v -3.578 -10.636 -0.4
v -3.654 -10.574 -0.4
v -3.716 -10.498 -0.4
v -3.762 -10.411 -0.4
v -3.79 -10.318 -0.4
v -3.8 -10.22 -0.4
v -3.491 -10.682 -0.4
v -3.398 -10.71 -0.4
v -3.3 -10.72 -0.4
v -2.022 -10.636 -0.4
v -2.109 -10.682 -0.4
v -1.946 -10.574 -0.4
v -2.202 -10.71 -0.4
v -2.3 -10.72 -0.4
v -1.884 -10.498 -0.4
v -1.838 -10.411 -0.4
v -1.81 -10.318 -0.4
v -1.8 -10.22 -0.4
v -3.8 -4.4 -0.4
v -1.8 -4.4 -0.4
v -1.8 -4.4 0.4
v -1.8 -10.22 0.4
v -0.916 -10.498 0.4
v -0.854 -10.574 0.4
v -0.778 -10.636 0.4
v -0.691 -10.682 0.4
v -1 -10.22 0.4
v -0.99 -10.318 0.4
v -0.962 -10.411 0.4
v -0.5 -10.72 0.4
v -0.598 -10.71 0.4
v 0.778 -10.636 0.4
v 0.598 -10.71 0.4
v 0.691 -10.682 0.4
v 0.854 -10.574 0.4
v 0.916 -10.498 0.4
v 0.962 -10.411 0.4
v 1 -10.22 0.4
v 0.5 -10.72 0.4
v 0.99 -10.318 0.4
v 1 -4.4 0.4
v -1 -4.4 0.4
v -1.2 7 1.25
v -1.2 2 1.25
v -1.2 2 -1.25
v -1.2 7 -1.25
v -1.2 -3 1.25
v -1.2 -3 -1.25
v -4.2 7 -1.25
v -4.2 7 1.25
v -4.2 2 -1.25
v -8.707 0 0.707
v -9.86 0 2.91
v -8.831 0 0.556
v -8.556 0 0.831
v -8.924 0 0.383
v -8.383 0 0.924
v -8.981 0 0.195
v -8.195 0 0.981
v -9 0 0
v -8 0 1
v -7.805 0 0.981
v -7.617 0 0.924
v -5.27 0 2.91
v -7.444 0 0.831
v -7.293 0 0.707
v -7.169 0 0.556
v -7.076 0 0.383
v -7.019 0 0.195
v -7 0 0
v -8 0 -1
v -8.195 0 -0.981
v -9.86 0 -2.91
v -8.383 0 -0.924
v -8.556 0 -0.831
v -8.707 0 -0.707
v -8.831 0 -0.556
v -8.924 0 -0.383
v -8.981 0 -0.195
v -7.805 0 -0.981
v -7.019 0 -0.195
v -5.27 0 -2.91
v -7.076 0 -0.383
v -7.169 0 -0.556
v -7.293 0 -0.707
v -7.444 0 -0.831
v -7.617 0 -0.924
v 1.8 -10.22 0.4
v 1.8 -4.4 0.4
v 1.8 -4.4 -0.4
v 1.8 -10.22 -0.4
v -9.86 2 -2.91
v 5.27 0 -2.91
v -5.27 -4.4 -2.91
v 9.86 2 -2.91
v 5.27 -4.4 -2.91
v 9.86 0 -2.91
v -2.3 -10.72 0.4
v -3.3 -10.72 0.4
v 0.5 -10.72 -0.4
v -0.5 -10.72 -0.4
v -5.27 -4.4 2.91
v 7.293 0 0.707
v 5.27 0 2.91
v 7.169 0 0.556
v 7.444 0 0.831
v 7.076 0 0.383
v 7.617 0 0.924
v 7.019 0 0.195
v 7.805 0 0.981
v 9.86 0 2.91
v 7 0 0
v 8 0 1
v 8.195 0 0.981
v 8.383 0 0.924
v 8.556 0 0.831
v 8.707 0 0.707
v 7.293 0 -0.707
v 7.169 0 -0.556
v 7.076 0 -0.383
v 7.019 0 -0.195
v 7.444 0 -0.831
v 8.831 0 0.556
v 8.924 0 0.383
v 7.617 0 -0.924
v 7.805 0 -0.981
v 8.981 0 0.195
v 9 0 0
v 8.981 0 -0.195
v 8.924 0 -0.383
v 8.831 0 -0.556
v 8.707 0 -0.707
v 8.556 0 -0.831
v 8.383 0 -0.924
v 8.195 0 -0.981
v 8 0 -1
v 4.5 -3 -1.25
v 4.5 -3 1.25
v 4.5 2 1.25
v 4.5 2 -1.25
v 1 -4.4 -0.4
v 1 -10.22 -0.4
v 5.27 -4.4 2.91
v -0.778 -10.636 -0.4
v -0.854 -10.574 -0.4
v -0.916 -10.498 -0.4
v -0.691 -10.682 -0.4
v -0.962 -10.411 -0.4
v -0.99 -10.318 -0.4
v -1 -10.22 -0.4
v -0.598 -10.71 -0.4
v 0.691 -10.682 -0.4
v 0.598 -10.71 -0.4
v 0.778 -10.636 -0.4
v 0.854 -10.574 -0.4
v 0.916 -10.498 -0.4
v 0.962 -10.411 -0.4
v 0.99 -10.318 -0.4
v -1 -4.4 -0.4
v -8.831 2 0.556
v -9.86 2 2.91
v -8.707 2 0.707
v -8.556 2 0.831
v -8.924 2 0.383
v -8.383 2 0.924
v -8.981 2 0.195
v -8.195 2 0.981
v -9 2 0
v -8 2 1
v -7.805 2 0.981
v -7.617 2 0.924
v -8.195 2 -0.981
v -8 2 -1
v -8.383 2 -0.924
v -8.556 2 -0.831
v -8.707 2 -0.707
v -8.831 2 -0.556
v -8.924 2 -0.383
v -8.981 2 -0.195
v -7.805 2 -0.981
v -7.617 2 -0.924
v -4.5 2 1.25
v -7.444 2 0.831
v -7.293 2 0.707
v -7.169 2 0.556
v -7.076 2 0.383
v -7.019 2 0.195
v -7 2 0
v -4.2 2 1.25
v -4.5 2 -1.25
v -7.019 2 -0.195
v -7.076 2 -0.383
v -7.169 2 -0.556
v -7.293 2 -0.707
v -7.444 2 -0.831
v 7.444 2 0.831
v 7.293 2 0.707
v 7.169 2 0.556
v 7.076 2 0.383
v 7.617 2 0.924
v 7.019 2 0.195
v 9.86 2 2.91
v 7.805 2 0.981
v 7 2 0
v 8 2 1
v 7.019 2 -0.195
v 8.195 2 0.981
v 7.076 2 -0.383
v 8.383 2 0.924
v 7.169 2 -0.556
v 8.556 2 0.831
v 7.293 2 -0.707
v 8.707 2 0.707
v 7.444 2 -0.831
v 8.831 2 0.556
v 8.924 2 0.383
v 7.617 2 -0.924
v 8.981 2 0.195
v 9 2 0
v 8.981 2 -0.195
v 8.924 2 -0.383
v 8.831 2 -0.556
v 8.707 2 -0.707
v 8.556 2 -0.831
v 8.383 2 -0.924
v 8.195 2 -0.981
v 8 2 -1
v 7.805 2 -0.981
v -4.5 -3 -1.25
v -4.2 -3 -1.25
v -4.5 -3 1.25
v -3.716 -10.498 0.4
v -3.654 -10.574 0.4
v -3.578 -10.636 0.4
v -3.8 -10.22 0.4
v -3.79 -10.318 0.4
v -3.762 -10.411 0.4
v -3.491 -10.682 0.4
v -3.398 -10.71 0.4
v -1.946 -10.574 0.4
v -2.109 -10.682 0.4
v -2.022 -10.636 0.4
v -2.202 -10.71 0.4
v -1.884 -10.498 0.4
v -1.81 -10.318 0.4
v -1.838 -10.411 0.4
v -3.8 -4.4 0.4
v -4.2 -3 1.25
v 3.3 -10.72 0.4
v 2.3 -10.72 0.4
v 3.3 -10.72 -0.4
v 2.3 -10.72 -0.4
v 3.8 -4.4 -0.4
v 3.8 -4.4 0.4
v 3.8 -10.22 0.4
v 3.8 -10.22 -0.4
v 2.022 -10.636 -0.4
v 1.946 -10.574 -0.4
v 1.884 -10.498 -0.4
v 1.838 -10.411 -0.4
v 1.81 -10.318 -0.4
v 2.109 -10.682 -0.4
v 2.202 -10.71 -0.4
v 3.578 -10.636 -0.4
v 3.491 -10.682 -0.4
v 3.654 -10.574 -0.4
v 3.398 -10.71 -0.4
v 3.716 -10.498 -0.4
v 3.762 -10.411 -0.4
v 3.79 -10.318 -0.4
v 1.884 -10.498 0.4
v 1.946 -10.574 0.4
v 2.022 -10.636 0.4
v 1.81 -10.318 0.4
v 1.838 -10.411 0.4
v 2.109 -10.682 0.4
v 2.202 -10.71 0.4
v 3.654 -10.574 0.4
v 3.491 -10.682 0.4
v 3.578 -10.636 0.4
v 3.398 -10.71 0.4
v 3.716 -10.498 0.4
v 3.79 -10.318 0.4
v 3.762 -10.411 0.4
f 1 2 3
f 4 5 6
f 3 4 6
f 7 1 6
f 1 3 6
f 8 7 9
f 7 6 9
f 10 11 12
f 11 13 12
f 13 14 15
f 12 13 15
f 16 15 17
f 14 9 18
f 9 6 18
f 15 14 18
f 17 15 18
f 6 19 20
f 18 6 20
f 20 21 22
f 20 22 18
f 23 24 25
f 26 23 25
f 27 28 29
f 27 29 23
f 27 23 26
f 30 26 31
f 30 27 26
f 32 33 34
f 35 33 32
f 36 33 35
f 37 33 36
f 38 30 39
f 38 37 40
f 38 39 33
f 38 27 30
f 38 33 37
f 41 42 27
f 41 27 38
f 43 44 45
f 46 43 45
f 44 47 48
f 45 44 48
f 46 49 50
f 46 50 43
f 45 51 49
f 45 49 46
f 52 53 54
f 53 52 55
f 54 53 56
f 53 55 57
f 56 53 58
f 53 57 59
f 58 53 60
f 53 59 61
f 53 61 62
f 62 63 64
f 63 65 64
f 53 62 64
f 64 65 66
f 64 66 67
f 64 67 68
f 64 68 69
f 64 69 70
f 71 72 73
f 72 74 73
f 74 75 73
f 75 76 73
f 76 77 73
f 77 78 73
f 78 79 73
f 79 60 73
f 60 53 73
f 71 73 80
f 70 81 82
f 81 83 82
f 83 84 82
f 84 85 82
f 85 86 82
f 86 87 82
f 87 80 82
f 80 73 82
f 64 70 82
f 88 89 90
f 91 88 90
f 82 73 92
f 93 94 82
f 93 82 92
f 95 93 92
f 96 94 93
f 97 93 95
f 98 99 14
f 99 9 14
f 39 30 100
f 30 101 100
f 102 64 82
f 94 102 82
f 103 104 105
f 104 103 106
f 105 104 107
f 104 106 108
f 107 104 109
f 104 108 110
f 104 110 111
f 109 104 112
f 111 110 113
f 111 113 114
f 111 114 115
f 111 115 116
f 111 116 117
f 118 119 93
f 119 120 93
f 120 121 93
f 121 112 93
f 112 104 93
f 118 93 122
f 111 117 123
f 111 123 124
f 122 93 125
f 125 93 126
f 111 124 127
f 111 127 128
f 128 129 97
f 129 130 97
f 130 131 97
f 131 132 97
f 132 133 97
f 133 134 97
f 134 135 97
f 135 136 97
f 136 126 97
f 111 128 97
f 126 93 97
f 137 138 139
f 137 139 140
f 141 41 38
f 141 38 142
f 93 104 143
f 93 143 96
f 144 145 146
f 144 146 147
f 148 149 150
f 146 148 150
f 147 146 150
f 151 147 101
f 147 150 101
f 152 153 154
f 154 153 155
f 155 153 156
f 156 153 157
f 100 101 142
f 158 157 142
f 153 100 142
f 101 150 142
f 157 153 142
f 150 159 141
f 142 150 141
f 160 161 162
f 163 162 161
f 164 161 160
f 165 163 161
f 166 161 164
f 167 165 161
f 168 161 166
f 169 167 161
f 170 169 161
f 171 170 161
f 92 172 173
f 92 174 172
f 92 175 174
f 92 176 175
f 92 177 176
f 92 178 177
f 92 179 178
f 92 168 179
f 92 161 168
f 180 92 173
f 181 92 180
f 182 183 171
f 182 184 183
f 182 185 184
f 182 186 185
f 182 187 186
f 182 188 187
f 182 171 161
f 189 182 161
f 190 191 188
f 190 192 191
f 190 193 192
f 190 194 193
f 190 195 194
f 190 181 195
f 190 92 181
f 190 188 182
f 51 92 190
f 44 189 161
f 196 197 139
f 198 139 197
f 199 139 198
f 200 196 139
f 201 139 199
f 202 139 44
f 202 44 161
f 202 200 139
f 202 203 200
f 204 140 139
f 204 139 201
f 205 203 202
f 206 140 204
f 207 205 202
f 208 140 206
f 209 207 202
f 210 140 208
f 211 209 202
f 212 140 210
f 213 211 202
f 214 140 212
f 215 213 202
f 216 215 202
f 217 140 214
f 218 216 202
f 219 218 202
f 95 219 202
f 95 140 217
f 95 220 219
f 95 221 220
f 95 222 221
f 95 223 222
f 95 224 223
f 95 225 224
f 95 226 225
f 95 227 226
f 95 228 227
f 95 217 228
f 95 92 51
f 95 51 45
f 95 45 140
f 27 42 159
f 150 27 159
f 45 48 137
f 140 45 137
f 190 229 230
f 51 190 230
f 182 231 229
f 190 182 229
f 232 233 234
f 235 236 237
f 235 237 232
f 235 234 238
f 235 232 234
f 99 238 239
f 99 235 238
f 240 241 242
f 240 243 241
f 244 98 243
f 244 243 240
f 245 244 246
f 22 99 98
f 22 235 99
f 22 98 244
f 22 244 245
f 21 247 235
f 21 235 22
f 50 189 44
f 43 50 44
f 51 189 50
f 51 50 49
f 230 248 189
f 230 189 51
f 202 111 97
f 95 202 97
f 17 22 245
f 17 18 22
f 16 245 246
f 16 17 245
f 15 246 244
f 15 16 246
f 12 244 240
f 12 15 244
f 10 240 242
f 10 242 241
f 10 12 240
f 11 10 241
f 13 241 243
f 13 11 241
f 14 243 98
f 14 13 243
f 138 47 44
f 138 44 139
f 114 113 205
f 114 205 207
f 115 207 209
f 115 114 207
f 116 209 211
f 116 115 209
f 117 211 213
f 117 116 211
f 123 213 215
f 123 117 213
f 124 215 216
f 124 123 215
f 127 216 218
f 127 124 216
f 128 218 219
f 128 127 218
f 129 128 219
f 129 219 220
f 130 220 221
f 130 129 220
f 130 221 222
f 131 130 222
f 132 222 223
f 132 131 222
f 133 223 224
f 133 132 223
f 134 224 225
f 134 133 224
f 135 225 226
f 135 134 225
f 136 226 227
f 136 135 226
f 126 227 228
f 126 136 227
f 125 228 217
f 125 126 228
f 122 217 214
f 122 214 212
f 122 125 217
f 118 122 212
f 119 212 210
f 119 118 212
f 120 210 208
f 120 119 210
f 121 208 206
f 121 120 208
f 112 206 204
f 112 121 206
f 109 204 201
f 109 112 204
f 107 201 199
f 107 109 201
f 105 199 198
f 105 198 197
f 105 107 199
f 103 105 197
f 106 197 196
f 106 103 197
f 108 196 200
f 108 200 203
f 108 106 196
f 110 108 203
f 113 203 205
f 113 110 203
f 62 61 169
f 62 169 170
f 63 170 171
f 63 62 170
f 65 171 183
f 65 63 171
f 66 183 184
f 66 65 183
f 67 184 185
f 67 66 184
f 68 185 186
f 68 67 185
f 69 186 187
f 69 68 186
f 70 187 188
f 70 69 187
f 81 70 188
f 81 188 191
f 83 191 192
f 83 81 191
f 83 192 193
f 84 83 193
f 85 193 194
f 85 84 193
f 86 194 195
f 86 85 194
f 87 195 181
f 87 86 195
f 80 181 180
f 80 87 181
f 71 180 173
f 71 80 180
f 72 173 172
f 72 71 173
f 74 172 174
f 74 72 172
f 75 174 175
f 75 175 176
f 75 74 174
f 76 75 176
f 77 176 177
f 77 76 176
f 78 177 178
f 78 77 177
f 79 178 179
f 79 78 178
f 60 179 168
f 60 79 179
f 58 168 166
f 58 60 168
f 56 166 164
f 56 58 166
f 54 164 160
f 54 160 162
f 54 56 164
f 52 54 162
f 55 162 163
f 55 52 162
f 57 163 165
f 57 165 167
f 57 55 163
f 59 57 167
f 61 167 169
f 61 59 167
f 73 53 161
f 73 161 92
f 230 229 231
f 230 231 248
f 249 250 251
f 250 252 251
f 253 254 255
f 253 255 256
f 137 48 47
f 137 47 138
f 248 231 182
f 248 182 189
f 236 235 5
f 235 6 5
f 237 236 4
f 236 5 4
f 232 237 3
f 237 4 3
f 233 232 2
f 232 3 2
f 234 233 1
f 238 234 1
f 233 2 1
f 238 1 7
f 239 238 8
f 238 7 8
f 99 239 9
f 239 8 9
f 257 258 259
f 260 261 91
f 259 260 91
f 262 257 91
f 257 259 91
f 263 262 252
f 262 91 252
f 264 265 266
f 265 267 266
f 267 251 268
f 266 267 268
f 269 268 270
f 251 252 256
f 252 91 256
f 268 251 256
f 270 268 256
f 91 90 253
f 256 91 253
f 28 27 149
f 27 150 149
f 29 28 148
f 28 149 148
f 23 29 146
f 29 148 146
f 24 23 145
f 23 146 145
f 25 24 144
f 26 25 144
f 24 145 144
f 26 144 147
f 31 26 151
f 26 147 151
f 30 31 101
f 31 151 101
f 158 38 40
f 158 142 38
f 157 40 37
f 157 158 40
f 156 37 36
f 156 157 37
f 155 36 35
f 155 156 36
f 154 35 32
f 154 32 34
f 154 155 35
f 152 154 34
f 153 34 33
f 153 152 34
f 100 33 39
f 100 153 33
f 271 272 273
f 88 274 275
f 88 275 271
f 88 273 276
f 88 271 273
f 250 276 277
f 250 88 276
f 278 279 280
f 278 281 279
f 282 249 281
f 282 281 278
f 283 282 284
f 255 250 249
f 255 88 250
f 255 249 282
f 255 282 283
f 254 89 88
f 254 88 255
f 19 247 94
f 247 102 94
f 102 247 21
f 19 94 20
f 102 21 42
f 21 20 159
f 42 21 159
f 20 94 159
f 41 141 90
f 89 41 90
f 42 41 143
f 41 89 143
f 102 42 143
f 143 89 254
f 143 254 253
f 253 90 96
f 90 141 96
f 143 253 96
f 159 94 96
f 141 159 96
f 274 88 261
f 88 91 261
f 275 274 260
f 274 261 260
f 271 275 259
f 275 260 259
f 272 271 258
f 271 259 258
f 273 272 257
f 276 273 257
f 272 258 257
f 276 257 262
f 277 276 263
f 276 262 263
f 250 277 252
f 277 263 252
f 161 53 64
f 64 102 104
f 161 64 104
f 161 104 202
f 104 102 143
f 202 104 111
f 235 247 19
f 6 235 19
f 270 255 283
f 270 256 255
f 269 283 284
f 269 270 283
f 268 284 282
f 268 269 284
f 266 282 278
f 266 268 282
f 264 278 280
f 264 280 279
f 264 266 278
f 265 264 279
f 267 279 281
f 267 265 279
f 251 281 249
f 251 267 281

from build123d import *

# Parameters (mm, degrees)
SKETCH1_W               = 19.72
SKETCH1_H               = 5.82
SKETCH1_R               = 1
BOSS_EXTRUDE1_DEPTH     = 2
SKETCH1_3_W             = 10.54
SKETCH1_3_H             = 5.82
BOSS_EXTRUDE2_DEPTH     = 4.4
CUT_EXTRUDE1_DEPTH      = 12.182472893
CUT_EXTRUDE1_DEPTH_BACK = 3
SKETCH1_4_W             = 9
SKETCH1_4_H             = 2.5
BOSS_EXTRUDE3_START     = -3
SKETCH1_5_W             = 3
SKETCH1_5_H             = 2.5
BOSS_EXTRUDE3_DEPTH     = 5
BOSS_EXTRUDE4_START     = 2
SKETCH1_6_W             = 3
SKETCH1_6_H             = 2.5
BOSS_EXTRUDE4_DEPTH     = 5
BOSS_EXTRUDE5_START     = -4.4
SKETCH2_W               = 2
SKETCH2_H               = 0.8
BOSS_EXTRUDE5_DEPTH     = 6.32
FILLET1_R               = 0.5


with BuildPart() as part:
    # Sketch1 → Boss-Extrude1 (new body)
    with BuildSketch(Plane(origin=(0, 0, 0), x_dir=(1, 0, 0), z_dir=(0, 1, 0))):
        Rectangle(SKETCH1_W, SKETCH1_H)
        with Locations(Location((8, 0, 0), (0, 0, 270))):
            Circle(SKETCH1_R, mode=Mode.SUBTRACT)
        with Locations(Location((-8, 0, 0), (0, 0, 270))):
            Circle(SKETCH1_R, mode=Mode.SUBTRACT)
    extrude(amount=BOSS_EXTRUDE1_DEPTH)

    # Sketch1<3> → Boss-Extrude2 (add)
    with BuildSketch(Plane(origin=(0, 0, 0), x_dir=(1, 0, 0), z_dir=(0, 1, 0))):
        Rectangle(SKETCH1_3_W, SKETCH1_3_H)
    extrude(amount=-BOSS_EXTRUDE2_DEPTH)

    # Sketch1<4> → Cut-Extrude1 (cut, two sides: drawn at the far end of the back side and taken through both)
    with BuildSketch(Plane(origin=(0, 0, 0), x_dir=(1, 0, 0), z_dir=(0, 1, 0)).offset(-CUT_EXTRUDE1_DEPTH_BACK)):
        Rectangle(SKETCH1_4_W, SKETCH1_4_H)
    extrude(amount=CUT_EXTRUDE1_DEPTH + CUT_EXTRUDE1_DEPTH_BACK, mode=Mode.SUBTRACT)

    # Sketch1<5> → Boss-Extrude3 (add)
    with BuildSketch(Plane(origin=(0, 0, 0), x_dir=(1, 0, 0), z_dir=(0, 1, 0)).offset(BOSS_EXTRUDE3_START)):
        with Locations((-2.7, 0)):
            Rectangle(SKETCH1_5_W, SKETCH1_5_H)
    extrude(amount=BOSS_EXTRUDE3_DEPTH)

    # Sketch1<6> → Boss-Extrude4 (add)
    with BuildSketch(Plane(origin=(0, 0, 0), x_dir=(1, 0, 0), z_dir=(0, 1, 0)).offset(BOSS_EXTRUDE4_START)):
        with Locations((-2.7, 0)):
            Rectangle(SKETCH1_6_W, SKETCH1_6_H)
    extrude(amount=BOSS_EXTRUDE4_DEPTH)

    # Sketch2 → Boss-Extrude5 (add)
    with BuildSketch(Plane(origin=(0, 0, 0), x_dir=(1, 0, 0), z_dir=(0, 1, 0)).offset(BOSS_EXTRUDE5_START)):
        with Locations((-2.8, 0)):
            Rectangle(SKETCH2_W, SKETCH2_H)
        Rectangle(SKETCH2_W, SKETCH2_H)
        with Locations((2.8, 0)):
            Rectangle(SKETCH2_W, SKETCH2_H)
    extrude(amount=-BOSS_EXTRUDE5_DEPTH)

    # Fillet1
    fillet1_edges = [part.edges().sort_by_distance(p)[0] for p in [
        (1.8, -10.72, 0),
        (3.8, -10.72, 0),
        (-3.8, -10.72, 0),
        (-1.8, -10.72, 0),
        (-1, -10.72, 0),
        (1, -10.72, 0),
    ]]
    fillet(fillet1_edges, radius=FILLET1_R)


solid = part.part
